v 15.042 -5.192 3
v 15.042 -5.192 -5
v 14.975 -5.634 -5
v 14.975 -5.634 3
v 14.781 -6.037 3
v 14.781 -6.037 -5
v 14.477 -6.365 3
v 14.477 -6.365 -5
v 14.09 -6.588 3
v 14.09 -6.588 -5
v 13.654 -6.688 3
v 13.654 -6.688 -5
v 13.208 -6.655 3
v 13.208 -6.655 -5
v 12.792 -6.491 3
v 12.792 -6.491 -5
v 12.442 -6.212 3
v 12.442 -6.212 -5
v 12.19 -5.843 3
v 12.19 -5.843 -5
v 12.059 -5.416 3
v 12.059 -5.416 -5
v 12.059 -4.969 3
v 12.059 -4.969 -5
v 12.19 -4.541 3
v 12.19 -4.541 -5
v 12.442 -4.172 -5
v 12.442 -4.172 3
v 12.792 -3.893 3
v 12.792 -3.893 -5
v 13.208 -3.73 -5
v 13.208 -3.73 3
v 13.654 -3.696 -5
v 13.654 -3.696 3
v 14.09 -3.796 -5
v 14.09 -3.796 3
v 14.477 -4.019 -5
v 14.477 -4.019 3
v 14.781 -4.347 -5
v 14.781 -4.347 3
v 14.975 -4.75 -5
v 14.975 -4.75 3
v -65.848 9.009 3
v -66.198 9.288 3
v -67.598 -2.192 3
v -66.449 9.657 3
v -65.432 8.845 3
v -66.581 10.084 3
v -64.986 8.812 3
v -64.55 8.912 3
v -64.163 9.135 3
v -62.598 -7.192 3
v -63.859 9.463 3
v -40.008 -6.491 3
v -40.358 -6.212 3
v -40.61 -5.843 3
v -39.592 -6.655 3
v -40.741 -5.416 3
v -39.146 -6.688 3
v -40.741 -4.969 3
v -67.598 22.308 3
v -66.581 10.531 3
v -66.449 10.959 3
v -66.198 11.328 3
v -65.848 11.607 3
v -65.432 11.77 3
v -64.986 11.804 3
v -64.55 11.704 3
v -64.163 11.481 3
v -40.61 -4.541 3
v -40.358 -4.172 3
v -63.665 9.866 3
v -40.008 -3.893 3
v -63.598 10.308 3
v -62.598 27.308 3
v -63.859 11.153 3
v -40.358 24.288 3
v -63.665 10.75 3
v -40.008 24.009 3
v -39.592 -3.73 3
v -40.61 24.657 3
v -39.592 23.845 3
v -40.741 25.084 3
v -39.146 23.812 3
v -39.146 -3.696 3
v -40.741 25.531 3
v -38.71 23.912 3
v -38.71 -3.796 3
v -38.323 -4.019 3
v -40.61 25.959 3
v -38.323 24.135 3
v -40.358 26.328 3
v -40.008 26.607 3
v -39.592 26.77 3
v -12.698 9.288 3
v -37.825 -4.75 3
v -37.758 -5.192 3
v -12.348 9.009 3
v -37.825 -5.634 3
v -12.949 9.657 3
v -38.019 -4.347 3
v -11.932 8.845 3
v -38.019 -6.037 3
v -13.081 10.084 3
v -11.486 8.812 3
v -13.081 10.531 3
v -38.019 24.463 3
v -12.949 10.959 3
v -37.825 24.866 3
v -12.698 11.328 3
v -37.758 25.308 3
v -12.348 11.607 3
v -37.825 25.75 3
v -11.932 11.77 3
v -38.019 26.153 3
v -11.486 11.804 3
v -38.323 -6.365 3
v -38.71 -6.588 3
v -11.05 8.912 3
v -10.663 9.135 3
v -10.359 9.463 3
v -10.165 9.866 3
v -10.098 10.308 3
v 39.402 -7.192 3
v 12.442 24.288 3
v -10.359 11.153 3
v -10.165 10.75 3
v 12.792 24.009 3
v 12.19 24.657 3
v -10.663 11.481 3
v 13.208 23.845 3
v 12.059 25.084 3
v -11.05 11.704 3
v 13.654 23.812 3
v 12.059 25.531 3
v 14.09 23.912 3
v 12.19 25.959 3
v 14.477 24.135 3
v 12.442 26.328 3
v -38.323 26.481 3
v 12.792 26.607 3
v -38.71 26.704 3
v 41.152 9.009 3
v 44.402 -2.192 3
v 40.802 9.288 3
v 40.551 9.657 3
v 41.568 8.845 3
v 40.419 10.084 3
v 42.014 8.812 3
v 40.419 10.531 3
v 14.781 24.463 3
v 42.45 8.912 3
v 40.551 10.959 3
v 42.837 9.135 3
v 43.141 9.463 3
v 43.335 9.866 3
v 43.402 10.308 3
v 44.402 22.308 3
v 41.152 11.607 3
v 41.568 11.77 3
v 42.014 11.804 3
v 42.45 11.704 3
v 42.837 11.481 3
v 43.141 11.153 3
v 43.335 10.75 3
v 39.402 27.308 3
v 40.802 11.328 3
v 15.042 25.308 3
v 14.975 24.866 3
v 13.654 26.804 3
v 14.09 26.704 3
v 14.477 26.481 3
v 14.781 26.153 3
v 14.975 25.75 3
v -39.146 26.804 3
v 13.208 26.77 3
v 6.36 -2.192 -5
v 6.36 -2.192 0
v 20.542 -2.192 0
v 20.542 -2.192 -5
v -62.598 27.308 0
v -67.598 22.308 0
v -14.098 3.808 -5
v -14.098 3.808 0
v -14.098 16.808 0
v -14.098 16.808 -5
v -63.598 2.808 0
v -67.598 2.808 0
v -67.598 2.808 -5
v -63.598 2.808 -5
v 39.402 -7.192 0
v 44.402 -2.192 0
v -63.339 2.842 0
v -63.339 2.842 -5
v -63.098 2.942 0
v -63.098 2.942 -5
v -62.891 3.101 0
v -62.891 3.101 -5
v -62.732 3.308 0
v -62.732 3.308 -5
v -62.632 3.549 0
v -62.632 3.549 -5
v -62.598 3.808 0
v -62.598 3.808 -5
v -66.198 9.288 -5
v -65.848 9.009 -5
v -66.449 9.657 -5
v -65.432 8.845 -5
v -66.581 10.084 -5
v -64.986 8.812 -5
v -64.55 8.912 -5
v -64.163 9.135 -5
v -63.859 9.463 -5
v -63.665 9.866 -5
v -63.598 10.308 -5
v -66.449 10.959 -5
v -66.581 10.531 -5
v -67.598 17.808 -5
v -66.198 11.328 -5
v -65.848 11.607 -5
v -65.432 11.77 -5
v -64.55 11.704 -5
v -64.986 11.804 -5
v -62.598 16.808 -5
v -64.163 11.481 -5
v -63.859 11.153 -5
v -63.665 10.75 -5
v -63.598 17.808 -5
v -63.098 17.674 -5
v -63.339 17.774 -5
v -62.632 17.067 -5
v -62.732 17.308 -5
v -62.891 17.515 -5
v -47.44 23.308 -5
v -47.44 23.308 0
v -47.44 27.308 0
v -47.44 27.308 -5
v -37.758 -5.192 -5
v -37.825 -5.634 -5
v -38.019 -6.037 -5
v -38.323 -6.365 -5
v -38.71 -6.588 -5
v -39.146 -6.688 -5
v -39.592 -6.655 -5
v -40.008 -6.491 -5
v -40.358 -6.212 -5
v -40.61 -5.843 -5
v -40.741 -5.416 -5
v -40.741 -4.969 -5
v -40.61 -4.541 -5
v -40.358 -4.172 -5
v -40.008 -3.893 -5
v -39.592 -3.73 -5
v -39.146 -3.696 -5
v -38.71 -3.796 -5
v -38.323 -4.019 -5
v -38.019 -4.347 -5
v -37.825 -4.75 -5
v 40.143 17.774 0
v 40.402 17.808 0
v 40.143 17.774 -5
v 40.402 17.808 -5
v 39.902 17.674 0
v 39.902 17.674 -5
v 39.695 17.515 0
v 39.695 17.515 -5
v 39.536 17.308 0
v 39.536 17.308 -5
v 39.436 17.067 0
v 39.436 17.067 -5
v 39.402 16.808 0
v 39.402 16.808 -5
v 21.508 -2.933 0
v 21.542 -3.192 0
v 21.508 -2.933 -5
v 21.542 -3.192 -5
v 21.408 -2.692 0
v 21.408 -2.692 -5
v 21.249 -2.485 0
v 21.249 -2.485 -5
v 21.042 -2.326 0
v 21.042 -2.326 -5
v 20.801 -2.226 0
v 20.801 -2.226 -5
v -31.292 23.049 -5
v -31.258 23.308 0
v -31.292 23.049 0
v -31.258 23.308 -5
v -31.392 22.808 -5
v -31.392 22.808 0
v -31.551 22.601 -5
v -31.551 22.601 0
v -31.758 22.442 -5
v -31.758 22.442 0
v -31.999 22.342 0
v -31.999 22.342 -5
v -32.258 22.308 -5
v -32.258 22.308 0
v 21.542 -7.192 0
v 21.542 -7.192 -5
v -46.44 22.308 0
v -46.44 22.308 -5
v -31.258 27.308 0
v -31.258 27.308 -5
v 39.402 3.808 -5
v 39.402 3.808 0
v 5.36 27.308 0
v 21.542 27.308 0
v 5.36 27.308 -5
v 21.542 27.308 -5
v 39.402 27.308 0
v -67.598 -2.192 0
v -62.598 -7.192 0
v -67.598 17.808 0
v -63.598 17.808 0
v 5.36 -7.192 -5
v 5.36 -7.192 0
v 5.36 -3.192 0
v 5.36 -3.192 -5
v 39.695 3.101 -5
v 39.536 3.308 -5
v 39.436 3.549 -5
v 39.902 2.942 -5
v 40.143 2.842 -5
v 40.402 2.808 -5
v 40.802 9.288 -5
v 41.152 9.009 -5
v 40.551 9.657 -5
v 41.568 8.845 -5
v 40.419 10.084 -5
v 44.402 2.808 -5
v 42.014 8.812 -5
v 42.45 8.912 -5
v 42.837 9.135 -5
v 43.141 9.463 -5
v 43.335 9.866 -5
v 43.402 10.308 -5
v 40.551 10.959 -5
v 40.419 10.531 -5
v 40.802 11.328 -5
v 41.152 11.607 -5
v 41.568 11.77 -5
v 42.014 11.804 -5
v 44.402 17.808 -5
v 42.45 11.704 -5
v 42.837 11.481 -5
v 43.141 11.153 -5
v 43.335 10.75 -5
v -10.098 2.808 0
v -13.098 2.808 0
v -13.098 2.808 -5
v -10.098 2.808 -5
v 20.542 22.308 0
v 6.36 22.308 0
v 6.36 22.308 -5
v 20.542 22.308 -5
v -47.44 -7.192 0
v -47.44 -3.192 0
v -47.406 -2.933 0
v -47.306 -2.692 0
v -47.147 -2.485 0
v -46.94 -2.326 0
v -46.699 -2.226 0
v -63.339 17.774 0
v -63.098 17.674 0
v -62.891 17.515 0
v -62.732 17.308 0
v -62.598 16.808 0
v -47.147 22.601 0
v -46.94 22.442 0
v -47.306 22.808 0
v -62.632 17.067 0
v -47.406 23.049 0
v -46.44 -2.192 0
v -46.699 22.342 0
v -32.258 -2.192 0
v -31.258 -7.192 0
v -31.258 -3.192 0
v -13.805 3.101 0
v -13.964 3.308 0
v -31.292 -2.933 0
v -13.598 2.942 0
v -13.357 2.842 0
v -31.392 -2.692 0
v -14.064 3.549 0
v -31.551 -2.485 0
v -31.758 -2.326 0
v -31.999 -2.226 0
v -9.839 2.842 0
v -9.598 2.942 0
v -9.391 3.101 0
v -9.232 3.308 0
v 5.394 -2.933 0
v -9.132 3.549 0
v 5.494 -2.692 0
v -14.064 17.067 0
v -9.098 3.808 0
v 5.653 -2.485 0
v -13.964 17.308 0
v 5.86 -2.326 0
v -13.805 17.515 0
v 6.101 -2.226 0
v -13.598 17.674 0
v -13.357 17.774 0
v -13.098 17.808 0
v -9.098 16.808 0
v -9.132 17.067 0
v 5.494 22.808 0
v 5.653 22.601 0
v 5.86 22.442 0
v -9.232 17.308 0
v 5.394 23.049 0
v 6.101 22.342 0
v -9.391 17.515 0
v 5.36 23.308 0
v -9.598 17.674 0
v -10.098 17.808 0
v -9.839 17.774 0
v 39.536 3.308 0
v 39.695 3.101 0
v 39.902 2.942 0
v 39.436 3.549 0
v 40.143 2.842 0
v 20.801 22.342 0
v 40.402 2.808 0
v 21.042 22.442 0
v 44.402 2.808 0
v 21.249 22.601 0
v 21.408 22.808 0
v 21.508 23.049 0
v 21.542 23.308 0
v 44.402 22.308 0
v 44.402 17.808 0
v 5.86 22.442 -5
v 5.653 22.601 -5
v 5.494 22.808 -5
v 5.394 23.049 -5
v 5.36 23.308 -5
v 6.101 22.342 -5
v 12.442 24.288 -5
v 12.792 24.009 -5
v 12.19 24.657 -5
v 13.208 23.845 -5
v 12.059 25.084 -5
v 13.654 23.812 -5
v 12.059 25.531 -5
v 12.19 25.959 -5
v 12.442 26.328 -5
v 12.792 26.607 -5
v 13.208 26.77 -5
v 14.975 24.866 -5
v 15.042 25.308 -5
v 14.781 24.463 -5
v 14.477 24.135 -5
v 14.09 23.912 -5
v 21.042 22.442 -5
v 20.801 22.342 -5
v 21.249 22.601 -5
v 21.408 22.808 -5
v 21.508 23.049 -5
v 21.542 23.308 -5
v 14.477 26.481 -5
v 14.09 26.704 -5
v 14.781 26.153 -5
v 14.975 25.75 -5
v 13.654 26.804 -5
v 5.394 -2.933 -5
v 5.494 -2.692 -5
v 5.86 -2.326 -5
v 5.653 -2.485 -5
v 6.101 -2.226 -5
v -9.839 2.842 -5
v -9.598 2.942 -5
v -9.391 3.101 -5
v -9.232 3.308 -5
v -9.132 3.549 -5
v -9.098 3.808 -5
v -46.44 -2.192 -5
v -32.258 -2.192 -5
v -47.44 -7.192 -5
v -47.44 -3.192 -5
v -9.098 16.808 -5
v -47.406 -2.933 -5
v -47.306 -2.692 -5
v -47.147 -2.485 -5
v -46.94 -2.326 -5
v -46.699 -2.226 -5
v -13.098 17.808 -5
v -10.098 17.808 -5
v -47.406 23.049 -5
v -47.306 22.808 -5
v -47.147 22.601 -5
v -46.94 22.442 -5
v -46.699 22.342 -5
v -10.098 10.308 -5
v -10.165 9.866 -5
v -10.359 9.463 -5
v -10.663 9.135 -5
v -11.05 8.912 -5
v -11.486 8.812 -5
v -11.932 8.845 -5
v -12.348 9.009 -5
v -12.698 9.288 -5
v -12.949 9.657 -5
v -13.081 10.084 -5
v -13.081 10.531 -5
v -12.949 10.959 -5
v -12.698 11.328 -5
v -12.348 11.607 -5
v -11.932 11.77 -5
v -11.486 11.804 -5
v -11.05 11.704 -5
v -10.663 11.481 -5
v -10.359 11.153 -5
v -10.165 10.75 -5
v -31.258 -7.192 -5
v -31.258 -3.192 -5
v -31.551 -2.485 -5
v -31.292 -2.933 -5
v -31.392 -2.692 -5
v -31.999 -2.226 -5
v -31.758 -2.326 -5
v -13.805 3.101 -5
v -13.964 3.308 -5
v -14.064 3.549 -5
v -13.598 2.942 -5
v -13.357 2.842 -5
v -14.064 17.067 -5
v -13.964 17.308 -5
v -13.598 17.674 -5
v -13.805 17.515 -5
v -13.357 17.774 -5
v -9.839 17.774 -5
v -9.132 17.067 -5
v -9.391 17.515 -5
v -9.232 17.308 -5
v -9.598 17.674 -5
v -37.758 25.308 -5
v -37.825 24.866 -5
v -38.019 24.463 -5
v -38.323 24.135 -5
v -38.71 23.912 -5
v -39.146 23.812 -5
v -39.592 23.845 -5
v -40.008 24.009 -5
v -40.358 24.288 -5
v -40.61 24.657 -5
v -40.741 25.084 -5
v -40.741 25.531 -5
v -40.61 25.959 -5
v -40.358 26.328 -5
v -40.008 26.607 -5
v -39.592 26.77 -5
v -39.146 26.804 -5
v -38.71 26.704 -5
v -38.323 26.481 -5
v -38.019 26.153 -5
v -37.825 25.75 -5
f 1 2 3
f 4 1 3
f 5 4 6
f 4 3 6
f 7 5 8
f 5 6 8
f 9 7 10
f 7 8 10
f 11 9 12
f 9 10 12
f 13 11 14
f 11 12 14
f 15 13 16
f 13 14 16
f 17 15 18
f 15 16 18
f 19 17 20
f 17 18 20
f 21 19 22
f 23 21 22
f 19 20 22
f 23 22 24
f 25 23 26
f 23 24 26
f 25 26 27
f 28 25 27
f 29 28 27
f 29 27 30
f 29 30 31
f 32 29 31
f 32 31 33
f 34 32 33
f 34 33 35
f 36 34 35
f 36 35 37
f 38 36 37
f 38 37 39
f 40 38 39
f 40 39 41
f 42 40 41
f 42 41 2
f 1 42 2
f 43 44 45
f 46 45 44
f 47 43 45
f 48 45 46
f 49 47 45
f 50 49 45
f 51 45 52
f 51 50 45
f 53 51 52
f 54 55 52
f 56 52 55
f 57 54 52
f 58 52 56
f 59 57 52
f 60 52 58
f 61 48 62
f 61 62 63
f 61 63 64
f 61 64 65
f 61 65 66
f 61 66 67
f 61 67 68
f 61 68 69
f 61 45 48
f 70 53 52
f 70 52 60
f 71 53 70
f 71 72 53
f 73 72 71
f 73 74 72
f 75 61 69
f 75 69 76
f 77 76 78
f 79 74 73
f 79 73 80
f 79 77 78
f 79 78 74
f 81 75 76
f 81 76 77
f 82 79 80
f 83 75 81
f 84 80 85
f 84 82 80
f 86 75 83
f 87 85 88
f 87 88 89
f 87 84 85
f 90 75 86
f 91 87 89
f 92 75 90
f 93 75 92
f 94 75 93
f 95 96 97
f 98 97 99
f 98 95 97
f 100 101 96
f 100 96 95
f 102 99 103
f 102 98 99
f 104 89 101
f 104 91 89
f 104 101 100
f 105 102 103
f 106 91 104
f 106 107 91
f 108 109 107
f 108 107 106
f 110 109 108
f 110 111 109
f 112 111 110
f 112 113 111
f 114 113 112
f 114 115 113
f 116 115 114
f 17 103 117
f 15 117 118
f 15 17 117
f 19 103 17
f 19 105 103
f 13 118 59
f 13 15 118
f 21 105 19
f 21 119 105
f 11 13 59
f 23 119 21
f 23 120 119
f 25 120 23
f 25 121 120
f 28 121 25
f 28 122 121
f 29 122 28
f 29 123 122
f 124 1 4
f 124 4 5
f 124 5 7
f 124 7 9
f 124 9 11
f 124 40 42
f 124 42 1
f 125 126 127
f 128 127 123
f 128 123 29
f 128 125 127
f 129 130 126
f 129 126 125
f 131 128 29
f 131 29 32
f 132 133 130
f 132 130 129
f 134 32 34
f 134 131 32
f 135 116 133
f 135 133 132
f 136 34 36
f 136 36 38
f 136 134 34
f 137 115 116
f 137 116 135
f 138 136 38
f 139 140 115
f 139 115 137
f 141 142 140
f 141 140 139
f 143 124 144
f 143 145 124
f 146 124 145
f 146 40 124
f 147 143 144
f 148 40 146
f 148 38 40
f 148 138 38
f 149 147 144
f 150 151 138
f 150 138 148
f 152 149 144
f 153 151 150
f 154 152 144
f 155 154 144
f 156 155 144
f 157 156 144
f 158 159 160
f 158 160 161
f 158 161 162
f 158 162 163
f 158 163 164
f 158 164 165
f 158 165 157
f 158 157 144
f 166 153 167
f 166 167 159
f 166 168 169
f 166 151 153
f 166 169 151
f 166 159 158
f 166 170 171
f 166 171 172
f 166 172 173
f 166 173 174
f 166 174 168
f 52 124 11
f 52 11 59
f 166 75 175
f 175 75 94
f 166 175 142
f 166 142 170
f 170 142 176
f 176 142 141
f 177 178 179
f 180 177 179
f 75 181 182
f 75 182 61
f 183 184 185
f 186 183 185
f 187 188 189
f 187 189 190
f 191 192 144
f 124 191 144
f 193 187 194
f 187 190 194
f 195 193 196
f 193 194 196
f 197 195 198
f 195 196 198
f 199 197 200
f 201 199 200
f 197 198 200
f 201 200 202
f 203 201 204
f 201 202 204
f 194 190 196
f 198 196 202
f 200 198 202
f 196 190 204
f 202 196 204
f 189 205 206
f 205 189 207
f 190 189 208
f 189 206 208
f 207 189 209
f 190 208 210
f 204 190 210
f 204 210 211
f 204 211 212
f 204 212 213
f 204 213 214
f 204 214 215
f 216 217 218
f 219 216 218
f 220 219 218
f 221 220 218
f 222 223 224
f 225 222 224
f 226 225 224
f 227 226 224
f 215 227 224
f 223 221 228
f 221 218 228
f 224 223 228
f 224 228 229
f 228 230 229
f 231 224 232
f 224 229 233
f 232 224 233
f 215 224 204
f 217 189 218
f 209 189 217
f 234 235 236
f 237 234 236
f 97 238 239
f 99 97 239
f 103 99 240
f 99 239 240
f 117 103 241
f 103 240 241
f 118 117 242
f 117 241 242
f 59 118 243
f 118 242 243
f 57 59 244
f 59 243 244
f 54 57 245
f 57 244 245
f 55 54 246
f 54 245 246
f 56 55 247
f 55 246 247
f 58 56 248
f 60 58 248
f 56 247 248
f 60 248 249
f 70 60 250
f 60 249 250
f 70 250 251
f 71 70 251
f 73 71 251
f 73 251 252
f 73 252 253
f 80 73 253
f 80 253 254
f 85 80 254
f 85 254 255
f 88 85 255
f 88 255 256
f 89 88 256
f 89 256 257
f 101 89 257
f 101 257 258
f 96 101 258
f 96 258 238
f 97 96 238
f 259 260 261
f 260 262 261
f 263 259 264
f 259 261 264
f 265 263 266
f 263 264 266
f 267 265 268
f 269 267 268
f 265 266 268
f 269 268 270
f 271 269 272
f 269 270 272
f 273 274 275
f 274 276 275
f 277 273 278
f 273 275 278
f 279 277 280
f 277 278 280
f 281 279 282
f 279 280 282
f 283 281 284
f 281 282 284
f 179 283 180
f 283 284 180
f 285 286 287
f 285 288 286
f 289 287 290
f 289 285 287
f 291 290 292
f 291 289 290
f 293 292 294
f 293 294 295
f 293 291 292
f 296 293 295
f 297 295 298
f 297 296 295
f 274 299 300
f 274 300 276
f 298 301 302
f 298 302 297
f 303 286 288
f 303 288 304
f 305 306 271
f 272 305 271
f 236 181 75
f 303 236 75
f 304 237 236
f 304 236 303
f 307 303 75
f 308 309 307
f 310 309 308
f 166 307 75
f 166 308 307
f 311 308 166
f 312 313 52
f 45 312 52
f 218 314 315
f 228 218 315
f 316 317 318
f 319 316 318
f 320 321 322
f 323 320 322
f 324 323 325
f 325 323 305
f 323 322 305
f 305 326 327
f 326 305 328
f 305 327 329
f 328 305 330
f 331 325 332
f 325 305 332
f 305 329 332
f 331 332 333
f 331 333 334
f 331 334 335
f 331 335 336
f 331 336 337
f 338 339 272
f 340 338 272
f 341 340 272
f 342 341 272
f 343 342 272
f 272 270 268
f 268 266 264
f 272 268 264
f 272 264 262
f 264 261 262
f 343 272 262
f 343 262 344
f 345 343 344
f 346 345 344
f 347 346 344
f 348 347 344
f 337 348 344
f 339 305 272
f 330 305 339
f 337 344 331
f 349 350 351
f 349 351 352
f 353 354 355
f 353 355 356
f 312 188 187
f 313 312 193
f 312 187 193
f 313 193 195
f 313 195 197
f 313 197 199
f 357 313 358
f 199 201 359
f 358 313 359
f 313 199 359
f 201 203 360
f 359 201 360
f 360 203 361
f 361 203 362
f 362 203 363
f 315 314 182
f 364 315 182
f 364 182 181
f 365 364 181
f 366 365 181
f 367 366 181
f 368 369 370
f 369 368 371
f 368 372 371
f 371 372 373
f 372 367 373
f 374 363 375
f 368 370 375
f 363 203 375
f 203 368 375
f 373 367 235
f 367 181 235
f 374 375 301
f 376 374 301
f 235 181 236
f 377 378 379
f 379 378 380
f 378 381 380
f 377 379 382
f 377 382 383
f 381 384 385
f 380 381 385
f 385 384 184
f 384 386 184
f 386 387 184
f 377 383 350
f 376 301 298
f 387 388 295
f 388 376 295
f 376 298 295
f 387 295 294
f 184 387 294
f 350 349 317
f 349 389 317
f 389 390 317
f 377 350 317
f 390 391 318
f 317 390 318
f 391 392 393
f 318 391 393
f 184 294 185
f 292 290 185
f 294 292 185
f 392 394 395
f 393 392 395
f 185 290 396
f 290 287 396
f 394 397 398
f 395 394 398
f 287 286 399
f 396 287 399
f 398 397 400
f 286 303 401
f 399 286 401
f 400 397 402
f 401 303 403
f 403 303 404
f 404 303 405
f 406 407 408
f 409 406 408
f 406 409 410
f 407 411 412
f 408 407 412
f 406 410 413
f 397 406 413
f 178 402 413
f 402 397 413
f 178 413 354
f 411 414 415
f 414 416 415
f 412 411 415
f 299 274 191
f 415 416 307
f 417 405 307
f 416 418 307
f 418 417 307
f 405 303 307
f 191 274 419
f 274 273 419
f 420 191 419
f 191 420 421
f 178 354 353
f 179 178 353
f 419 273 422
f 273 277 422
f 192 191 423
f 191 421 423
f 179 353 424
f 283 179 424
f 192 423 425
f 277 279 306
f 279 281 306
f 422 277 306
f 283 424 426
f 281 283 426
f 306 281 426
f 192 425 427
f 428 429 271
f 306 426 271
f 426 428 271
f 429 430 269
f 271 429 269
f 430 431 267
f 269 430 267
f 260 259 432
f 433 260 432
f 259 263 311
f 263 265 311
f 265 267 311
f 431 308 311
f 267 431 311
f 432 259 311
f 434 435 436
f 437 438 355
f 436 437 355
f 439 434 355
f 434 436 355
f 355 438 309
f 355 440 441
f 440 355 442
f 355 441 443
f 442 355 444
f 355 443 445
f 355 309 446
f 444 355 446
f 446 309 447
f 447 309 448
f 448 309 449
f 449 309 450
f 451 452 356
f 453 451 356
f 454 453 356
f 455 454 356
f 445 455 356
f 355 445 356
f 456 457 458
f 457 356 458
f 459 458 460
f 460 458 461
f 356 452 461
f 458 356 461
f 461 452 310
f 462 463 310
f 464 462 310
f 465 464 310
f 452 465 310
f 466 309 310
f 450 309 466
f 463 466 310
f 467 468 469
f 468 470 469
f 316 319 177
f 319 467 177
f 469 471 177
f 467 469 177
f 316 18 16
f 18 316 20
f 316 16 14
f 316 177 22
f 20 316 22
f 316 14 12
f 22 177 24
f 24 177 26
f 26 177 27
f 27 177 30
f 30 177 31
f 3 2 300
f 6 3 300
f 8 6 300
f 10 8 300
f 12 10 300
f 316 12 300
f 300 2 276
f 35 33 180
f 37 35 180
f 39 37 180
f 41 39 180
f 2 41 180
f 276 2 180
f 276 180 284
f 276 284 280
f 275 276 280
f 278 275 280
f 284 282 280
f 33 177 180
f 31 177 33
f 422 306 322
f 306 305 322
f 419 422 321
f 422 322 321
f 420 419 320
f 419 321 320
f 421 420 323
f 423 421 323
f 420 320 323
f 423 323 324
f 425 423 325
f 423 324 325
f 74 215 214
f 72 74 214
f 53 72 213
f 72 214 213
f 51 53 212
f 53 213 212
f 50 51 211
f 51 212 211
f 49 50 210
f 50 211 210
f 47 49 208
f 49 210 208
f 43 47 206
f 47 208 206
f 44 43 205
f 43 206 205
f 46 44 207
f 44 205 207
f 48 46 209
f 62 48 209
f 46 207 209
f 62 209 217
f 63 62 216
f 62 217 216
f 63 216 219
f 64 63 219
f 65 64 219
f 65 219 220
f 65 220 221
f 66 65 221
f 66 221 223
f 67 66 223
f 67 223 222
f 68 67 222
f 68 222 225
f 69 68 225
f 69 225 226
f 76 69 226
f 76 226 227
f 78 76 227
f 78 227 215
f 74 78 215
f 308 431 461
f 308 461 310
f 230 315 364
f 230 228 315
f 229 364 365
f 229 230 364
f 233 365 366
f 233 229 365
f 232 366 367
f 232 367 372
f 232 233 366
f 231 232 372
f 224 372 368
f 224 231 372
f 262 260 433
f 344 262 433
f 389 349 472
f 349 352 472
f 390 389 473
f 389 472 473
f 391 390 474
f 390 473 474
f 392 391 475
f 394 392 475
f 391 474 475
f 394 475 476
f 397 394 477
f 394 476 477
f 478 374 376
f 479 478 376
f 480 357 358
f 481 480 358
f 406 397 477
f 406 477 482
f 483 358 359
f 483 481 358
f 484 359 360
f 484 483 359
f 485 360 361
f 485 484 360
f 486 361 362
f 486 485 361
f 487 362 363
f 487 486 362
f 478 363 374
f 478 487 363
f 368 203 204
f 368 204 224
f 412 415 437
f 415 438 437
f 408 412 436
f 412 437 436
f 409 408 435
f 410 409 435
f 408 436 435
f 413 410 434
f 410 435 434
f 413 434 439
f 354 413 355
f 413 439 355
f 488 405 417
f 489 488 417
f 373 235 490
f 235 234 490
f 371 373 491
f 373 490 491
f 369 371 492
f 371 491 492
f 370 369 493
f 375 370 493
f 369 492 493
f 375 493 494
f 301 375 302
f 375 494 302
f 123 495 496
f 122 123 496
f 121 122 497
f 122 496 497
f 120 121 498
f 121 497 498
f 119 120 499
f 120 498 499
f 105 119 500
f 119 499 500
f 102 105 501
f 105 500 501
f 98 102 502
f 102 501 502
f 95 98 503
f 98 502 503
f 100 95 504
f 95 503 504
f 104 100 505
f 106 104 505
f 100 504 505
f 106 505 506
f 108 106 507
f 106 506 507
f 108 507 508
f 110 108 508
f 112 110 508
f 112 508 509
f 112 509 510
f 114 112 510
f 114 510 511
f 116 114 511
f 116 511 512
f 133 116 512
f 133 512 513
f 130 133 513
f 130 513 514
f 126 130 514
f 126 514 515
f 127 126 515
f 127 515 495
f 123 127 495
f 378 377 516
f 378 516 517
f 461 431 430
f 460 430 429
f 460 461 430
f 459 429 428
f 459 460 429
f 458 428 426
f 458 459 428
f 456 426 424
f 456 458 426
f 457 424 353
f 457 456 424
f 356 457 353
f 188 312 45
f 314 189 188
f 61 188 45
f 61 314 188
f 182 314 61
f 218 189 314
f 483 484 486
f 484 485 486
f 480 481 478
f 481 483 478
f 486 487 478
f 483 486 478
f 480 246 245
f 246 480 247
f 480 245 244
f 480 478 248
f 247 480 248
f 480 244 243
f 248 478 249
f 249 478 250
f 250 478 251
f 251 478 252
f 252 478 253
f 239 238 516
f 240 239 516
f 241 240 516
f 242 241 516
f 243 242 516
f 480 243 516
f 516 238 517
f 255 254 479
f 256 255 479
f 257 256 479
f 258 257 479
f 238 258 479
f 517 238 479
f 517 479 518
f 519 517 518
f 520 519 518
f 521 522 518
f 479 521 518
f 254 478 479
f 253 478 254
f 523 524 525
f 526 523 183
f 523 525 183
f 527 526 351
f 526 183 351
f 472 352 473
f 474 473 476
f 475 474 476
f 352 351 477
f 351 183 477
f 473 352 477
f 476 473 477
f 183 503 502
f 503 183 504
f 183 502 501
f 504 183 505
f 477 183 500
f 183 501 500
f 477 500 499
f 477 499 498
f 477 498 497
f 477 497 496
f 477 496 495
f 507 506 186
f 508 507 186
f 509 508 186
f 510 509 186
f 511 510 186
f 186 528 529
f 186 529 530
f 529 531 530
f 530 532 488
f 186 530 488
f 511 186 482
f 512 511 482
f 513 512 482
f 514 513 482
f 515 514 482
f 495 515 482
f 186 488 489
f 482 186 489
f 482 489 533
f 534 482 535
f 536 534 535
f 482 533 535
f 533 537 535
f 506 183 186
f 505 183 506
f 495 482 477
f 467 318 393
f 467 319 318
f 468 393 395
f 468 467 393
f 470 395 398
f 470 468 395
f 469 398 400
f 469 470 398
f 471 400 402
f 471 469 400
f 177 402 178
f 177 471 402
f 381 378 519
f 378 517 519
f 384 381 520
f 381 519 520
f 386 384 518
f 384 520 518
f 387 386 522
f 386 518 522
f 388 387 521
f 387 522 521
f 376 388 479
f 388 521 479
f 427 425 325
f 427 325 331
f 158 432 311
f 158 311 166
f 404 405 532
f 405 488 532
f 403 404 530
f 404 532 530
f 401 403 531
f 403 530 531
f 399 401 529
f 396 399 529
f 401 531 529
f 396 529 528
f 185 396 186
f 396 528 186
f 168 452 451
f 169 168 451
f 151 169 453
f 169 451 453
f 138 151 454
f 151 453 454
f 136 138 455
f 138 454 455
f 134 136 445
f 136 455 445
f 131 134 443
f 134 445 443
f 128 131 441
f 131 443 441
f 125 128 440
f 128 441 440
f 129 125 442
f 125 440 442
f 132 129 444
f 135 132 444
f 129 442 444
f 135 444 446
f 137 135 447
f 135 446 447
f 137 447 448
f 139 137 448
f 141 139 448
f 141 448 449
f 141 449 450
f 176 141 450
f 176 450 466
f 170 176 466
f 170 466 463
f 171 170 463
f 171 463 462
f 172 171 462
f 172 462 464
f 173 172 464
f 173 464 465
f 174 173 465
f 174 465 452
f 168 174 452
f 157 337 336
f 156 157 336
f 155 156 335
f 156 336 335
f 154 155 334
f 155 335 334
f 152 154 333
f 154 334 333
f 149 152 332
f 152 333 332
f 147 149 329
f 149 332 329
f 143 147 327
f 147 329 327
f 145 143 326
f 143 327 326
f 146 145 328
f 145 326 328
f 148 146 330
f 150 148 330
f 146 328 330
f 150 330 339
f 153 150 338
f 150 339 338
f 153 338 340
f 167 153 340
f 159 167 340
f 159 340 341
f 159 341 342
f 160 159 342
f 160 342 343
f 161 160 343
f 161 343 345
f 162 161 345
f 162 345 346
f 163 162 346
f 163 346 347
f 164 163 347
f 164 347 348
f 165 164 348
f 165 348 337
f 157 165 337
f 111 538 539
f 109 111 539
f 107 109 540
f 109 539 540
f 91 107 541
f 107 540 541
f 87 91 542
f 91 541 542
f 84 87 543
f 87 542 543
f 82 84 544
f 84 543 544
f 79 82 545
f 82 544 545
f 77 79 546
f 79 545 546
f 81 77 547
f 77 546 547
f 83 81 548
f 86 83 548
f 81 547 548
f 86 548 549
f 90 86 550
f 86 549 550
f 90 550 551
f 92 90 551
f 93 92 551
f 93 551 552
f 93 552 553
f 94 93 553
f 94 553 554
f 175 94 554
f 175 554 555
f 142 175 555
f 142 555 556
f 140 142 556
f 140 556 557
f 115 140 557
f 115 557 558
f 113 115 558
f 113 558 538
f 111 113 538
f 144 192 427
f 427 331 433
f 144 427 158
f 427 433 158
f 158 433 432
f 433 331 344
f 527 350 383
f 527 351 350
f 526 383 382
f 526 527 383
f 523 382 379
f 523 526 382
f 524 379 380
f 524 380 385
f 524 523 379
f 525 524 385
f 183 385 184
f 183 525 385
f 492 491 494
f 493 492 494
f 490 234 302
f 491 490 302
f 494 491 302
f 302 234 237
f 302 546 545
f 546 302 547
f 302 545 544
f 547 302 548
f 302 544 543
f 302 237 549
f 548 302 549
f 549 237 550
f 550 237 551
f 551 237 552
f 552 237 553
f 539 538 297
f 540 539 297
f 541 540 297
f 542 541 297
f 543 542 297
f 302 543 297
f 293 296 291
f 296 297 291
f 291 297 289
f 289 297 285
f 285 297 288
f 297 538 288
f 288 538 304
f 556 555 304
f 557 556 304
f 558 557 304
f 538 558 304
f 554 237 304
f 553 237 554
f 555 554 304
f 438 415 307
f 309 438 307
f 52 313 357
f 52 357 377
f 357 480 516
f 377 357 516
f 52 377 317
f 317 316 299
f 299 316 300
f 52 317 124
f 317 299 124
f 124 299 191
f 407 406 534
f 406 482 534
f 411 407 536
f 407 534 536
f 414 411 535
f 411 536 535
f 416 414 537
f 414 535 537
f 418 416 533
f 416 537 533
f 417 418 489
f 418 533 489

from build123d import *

# Parameters (mm, degrees)
F1_W     = 112
F1_H     = 34.5
F2_DEPTH = 3
F0_W     = 5
F0_H     = 15
F0_W_2   = 16.181867
F0_H_2   = 5
F3_DEPTH = 5
F4_R     = 1.5
F5_DEPTH = 25
F6_R     = 1
F7_SIZE  = 5


with BuildPart() as f2:
    # F1 (on Top) → F2 (new body)
    with BuildSketch(Plane.XY):
        with Locations((-11.597955, 10.057821)):
            Rectangle(F1_W, F1_H)
    extrude(amount=F2_DEPTH)

    # F0 (on Top) → F3 (join)
    with BuildSketch(Plane.XY):
        with Locations((-65.097955, 10.307821)):
            Rectangle(F0_W, F0_H)
        with Locations((-11.597955, 10.307821)):
            Rectangle(F0_W, F0_H)
        with Locations((41.902045, 10.307821)):
            Rectangle(F0_W, F0_H)
        with Locations((-39.348996, 24.807821)):
            Rectangle(F0_W_2, F0_H_2)
        with Locations((-39.348996, -4.692179)):
            Rectangle(F0_W_2, F0_H_2)
        with Locations((13.451004, 24.807821)):
            Rectangle(F0_W_2, F0_H_2)
        with Locations((13.451004, -4.692179)):
            Rectangle(F0_W_2, F0_H_2)
    extrude(amount=-F3_DEPTH)

    # F4 (on face) → F5 (cut)
    with BuildSketch(Plane(origin=(0, 0, -5), x_dir=(1, 0, 0), z_dir=(0, 0, -1))):
        with Locations((-65.097955, -10.307821)):
            Circle(F4_R)
        with Locations((-11.597955, -10.307821)):
            Circle(F4_R)
        with Locations((41.902045, -10.307821)):
            Circle(F4_R)
        with Locations((-39.258062, 5.192179)):
            Circle(F4_R)
        with Locations((13.541938, 5.192179)):
            Circle(F4_R)
        with Locations((13.541938, -25.307821)):
            Circle(F4_R)
        with Locations((-39.258062, -25.307821)):
            Circle(F4_R)
    extrude(amount=-F5_DEPTH, mode=Mode.SUBTRACT)

    # F6
    f6_edges = [f2.edges().sort_by_distance(p)[0] for p in [
        (-62.597955, 2.807821, -2.5),
        (-62.597955, 17.807821, -2.5),
        (-47.439929, -2.192179, -2.5),
        (-31.258062, -2.192179, -2.5),
        (-47.439929, 22.307821, -2.5),
        (-31.258062, 22.307821, -2.5),
        (-14.097955, 17.807821, -2.5),
        (-14.097955, 2.807821, -2.5),
        (5.360071, -2.192179, -2.5),
        (21.541938, -2.192179, -2.5),
        (39.402045, 2.807821, -2.5),
        (-9.097955, 2.807821, -2.5),
        (-9.097955, 17.807821, -2.5),
        (39.402045, 17.807821, -2.5),
        (21.541938, 22.307821, -2.5),
        (5.360071, 22.307821, -2.5),
    ]]
    fillet(f6_edges, radius=F6_R)

    # F7
    f7_edges = [f2.edges().sort_by_distance(p)[0] for p in [
        (-67.597955, 27.307821, 1.5),
        (44.402045, 27.307821, 1.5),
        (44.402045, -7.192179, 1.5),
        (-67.597955, -7.192179, 1.5),
    ]]
    chamfer(f7_edges, length=F7_SIZE)


solid = f2.part
